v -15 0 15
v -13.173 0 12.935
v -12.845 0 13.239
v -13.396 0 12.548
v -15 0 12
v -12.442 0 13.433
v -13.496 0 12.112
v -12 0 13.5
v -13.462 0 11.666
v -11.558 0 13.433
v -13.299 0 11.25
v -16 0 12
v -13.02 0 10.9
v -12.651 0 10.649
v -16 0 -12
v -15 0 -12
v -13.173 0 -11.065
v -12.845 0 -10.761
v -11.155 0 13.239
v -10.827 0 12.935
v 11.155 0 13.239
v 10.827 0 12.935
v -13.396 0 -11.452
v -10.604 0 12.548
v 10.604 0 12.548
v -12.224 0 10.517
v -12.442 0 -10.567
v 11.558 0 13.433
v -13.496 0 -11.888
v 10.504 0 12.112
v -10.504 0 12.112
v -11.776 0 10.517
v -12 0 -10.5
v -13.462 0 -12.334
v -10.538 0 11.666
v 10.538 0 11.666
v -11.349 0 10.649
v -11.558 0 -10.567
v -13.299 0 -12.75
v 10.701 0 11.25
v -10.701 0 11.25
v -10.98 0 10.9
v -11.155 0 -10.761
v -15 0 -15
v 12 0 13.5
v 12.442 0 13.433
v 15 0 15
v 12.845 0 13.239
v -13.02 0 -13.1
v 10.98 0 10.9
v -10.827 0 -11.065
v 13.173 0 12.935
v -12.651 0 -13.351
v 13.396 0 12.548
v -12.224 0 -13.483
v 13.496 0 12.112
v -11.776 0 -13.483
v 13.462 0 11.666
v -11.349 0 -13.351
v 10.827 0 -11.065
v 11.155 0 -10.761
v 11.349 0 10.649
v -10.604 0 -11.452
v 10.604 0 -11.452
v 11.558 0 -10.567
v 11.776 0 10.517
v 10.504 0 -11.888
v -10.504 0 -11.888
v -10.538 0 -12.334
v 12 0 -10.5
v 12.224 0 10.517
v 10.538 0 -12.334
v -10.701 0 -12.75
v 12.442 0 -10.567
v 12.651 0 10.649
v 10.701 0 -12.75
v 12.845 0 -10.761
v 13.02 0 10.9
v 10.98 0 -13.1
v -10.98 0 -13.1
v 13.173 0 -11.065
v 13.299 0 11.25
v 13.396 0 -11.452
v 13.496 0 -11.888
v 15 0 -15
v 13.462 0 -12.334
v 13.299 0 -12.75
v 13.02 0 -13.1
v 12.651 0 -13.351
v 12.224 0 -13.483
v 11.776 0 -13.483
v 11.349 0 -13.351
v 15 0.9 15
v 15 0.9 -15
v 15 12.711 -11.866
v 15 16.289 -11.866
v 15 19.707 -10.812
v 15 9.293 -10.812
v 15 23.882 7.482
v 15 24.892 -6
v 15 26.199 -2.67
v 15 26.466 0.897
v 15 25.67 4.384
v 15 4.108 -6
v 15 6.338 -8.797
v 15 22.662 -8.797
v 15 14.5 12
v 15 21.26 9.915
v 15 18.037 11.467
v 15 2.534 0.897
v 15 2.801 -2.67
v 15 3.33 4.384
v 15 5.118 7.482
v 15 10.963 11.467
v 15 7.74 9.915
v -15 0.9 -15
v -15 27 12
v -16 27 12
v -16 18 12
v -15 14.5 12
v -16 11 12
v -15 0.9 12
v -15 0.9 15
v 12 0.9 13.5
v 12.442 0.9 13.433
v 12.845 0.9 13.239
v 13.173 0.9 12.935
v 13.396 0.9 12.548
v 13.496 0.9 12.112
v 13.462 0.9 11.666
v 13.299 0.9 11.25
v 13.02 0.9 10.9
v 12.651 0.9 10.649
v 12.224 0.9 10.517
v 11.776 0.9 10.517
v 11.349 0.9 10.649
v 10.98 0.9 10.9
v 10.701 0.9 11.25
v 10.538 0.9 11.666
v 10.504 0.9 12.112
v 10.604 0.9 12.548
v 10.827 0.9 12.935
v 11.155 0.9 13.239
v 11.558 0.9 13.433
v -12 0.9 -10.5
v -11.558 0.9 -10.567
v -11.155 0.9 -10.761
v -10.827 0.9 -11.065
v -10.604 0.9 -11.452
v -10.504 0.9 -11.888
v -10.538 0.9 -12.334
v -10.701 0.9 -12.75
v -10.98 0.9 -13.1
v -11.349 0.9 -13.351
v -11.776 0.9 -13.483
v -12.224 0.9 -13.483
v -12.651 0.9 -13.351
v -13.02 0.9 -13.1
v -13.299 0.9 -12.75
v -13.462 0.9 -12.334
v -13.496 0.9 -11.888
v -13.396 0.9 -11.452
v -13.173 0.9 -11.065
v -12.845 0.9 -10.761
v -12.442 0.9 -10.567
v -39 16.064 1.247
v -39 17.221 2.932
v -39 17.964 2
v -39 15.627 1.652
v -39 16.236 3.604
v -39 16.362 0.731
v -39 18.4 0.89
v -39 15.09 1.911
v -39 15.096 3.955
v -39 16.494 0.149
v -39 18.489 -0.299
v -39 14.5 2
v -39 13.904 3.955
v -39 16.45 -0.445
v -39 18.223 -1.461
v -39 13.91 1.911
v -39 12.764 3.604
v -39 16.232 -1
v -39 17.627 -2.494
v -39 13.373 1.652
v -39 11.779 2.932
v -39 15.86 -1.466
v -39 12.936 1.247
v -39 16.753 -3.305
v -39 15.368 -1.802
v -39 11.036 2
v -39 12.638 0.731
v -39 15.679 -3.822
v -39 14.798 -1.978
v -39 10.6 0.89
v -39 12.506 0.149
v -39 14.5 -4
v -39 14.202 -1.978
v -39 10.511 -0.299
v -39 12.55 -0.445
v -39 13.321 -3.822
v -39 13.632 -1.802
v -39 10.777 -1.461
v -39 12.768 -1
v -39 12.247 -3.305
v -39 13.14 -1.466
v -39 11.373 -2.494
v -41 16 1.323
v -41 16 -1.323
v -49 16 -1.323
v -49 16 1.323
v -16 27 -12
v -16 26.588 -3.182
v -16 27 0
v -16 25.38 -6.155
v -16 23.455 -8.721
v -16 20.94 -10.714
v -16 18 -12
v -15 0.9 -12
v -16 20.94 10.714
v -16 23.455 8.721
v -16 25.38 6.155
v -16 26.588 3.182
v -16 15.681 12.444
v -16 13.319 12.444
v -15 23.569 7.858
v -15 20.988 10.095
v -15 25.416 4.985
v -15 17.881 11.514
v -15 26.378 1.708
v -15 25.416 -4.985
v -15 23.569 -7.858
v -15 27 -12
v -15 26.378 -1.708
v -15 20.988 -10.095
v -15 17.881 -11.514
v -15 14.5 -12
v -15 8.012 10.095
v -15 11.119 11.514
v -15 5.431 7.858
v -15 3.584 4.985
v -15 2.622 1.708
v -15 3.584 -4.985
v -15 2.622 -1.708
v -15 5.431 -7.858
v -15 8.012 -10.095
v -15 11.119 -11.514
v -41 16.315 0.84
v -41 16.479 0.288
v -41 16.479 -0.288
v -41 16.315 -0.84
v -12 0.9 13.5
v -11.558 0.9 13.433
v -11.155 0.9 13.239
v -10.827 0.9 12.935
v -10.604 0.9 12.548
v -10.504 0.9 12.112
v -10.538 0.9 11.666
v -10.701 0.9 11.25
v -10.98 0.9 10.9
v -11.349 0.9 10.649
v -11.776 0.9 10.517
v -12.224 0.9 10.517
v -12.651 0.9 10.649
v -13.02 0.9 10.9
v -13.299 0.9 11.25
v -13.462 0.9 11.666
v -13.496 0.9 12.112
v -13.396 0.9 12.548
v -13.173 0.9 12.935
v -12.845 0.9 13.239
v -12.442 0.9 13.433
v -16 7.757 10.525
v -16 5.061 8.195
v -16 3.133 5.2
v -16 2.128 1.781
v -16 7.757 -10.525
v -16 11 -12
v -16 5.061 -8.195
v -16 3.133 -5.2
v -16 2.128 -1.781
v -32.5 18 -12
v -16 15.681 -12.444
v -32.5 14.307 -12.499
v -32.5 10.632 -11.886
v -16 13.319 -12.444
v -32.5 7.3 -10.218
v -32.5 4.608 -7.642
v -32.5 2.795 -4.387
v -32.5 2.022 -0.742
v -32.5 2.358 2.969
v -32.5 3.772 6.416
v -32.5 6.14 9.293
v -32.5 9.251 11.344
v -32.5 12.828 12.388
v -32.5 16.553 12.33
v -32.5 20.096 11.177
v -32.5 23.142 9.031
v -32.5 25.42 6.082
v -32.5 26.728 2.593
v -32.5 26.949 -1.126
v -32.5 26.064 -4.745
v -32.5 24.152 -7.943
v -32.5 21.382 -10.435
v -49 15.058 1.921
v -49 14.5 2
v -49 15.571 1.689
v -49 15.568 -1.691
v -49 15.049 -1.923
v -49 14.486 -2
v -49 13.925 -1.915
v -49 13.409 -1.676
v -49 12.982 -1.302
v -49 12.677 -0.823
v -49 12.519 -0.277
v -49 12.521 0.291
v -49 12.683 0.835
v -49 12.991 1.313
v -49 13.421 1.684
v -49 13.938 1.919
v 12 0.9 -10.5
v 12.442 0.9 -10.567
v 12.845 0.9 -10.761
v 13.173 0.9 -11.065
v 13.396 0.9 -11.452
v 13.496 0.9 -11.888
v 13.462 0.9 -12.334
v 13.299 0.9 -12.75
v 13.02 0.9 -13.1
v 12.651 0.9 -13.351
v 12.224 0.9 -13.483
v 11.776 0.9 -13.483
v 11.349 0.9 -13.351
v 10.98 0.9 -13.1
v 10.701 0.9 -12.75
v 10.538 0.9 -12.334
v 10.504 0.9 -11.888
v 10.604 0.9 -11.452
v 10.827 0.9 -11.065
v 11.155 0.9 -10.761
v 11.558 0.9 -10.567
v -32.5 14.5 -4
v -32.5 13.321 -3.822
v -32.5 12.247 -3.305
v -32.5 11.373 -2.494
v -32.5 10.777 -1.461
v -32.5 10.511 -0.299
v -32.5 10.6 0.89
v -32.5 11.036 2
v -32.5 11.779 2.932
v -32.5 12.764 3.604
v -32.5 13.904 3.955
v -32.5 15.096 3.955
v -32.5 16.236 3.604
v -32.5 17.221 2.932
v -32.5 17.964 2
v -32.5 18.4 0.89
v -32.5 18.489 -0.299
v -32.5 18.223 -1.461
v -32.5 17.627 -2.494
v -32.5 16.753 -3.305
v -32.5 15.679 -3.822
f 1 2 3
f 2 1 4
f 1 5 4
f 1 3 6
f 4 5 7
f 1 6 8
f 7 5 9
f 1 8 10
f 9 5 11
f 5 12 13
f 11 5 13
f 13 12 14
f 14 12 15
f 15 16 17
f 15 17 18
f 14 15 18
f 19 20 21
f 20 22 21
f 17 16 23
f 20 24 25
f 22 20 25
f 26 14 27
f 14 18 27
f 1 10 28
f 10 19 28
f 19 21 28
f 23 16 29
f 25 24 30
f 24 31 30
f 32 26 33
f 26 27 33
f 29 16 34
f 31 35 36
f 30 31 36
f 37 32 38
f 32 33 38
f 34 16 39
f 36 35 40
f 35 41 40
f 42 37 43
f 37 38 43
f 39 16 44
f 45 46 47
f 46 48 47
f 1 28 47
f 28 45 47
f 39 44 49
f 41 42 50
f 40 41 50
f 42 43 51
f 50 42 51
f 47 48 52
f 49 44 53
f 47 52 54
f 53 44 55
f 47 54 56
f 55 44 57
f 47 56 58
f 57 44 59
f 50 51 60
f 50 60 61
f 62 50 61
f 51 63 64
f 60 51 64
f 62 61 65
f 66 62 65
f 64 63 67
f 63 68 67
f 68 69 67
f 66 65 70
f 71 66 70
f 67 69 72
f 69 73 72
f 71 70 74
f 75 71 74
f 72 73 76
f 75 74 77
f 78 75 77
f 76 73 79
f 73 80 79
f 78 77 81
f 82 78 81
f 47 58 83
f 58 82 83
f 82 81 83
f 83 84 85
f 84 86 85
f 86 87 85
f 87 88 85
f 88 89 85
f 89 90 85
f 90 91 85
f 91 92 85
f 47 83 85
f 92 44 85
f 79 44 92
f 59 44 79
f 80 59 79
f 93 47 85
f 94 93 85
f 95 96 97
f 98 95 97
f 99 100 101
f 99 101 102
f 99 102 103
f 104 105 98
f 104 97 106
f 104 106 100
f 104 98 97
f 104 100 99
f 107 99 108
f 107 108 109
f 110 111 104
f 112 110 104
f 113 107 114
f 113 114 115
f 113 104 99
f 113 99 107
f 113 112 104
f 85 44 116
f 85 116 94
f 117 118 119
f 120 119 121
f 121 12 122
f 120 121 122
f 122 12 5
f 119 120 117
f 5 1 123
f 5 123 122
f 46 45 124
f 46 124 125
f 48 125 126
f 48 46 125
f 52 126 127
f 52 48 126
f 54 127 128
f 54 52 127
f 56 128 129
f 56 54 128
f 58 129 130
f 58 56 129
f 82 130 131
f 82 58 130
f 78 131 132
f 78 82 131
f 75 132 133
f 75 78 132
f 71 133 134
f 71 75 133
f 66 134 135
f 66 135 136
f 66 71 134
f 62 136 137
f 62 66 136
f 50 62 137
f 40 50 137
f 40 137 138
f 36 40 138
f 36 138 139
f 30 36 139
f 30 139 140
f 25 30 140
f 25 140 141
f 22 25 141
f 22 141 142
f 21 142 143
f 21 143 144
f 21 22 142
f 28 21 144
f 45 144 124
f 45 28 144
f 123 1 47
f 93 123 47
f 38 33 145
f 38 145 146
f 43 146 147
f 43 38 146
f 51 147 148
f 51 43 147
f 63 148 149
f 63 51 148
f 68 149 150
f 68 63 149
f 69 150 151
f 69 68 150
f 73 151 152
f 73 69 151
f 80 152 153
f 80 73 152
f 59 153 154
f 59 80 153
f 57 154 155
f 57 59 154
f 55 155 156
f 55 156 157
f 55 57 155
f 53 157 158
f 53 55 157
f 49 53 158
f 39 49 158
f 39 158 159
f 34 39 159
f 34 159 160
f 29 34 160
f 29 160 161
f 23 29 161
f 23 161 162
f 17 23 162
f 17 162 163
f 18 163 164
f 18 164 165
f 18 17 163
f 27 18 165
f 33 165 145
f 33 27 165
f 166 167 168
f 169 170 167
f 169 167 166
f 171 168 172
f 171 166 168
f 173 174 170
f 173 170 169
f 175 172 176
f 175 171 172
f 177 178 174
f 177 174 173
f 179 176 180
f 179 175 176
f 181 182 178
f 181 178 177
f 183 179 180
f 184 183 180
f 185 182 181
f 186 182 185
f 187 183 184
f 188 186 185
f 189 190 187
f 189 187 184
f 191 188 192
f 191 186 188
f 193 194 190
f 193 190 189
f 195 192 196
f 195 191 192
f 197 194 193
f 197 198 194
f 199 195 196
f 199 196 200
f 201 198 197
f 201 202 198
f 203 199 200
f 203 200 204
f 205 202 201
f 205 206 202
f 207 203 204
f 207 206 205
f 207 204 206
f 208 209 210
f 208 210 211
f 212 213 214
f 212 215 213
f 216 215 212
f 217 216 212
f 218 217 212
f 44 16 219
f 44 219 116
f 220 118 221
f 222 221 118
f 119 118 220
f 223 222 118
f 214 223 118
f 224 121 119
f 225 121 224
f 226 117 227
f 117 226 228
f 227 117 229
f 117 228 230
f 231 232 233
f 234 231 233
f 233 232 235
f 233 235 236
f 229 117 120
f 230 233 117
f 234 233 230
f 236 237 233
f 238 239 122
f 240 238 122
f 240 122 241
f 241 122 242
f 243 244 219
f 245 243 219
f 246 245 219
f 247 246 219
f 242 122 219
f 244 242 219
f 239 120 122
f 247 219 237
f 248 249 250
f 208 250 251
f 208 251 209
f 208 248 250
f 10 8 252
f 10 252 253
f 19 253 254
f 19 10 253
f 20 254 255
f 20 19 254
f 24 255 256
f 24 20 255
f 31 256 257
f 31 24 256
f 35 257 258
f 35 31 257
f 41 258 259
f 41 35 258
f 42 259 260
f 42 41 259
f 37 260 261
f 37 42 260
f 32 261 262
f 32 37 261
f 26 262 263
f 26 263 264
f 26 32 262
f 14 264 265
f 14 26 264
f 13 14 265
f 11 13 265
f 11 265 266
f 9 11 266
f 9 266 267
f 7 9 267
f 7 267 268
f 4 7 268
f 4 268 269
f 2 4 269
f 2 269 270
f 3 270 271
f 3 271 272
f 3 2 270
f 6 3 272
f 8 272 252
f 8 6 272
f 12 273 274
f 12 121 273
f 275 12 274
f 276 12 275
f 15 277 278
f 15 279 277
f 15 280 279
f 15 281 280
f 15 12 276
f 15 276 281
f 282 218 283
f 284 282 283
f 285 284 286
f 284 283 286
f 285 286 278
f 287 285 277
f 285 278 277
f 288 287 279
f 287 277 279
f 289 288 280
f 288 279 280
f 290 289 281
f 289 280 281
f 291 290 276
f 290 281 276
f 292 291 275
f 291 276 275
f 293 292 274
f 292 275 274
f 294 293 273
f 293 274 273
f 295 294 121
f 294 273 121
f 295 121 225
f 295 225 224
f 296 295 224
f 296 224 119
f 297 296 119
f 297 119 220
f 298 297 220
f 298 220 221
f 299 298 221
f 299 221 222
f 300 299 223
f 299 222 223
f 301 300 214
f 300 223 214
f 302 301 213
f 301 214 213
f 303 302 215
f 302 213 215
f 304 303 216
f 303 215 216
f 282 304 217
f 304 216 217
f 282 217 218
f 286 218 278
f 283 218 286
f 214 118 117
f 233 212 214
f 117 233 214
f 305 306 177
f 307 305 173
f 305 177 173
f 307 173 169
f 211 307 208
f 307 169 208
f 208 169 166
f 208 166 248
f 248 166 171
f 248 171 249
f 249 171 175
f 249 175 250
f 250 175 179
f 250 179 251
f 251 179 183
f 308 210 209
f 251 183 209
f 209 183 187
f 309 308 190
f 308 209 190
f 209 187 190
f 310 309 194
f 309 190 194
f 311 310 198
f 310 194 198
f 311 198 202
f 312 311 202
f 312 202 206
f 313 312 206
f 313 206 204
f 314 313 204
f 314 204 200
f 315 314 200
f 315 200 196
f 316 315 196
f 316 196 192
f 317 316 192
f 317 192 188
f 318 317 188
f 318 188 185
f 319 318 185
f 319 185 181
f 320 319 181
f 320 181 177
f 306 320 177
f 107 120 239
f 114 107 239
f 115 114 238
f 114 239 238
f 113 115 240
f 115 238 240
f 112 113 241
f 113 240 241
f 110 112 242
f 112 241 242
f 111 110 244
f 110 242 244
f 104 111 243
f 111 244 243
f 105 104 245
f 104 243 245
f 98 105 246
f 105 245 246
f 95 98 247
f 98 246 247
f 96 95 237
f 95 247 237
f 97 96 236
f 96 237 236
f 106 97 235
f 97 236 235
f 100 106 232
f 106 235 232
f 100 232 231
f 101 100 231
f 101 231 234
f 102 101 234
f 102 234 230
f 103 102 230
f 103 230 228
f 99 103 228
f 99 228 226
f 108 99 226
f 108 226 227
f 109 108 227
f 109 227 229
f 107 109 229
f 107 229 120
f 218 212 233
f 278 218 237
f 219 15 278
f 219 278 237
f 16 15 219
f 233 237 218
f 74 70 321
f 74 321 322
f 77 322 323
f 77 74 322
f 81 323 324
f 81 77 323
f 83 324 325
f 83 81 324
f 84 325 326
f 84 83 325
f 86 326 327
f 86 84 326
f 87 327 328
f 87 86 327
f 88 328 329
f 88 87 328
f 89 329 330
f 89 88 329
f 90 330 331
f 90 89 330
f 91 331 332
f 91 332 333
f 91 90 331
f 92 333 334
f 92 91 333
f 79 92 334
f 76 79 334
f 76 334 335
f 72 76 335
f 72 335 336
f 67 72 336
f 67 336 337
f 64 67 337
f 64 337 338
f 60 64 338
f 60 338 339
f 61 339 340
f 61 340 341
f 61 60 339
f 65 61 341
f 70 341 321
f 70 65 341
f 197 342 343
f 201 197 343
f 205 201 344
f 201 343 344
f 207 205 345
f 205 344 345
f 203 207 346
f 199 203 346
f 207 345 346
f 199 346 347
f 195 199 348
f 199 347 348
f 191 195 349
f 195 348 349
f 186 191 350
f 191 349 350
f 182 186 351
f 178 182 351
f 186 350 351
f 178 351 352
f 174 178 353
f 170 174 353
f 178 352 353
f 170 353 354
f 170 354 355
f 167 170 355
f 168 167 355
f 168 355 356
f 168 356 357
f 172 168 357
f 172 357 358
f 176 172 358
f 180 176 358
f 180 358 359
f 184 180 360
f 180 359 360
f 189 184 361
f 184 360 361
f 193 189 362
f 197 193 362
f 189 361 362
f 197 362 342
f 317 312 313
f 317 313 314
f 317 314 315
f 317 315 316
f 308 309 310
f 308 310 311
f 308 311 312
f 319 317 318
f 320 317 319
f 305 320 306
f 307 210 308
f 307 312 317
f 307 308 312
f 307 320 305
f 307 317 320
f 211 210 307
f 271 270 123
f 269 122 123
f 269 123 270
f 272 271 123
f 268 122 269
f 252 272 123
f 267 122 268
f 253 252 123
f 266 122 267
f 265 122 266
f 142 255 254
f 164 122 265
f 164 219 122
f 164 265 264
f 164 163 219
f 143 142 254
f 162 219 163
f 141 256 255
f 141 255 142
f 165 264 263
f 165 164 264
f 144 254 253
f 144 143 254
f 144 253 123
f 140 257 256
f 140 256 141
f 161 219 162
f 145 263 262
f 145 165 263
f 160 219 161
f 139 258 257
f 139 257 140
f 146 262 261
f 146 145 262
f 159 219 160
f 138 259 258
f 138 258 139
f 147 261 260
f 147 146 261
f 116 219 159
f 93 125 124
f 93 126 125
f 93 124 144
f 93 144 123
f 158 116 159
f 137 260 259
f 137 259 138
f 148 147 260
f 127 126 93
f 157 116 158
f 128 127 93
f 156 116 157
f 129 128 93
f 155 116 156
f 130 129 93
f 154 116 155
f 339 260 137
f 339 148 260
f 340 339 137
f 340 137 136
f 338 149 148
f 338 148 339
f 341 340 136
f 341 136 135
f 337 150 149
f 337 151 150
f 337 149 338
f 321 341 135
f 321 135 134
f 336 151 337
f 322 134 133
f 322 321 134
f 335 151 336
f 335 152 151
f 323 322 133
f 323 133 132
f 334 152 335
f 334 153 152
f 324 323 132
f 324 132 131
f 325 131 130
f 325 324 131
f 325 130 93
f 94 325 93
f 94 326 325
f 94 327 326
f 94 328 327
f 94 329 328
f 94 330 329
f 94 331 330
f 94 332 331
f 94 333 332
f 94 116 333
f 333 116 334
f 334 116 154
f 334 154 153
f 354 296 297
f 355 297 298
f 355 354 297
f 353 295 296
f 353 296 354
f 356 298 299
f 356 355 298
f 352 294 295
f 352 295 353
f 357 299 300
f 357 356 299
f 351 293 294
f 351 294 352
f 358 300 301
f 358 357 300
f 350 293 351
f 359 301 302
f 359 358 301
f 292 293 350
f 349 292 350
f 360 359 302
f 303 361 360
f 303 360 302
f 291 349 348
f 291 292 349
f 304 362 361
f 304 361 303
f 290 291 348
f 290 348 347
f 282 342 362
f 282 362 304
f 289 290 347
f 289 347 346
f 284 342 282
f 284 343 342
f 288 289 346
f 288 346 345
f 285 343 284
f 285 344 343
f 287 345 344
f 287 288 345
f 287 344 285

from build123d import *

# Parameters (mm, degrees)
SKETCH1_W           = 30
SKETCH1_H           = 30
SKETCH1_R           = 1.5
BOSS_EXTRUDE2_DEPTH = 0.9
SKETCH9_W           = 1
SKETCH9_H           = 24
BOSS_EXTRUDE3_DEPTH = 27
SKETCH10_R          = 12
BOSS_EXTRUDE4_DEPTH = 30
SKETCH11_R          = 12.5
BOSS_EXTRUDE5_DEPTH = 16.5
SKETCH12_R          = 4
BOSS_EXTRUDE6_DEPTH = 6.5
SKETCH13_R          = 2
BOSS_EXTRUDE7_DEPTH = 10
CUT_EXTRUDE1_START  = -8
CUT_EXTRUDE1_DEPTH  = 8


with BuildPart() as part:
    # Sketch1 → Boss-Extrude2 (new body)
    with BuildSketch(Plane(origin=(0, 0, 0), x_dir=(1, 0, 0), z_dir=(0, 1, 0))):
        Rectangle(SKETCH1_W, SKETCH1_H)
        with Locations(Location((-12, 12, 0), (0, 0, 270))):
            Circle(SKETCH1_R, mode=Mode.SUBTRACT)
        with Locations(Location((12, 12, 0), (0, 0, 270))):
            Circle(SKETCH1_R, mode=Mode.SUBTRACT)
        with Locations(Location((12, -12, 0), (0, 0, 270))):
            Circle(SKETCH1_R, mode=Mode.SUBTRACT)
        with Locations(Location((-12, -12, 0), (0, 0, 270))):
            Circle(SKETCH1_R, mode=Mode.SUBTRACT)
    extrude(amount=BOSS_EXTRUDE2_DEPTH)

    # Sketch9 → Boss-Extrude3 (add)
    with BuildSketch(Plane(origin=(0, 0, 0), x_dir=(1, 0, 0), z_dir=(0, 1, 0))):
        with Locations((-15.5, 0)):
            Rectangle(SKETCH9_W, SKETCH9_H)
    extrude(amount=BOSS_EXTRUDE3_DEPTH)

    # Sketch10 → Boss-Extrude4 (add)
    with BuildSketch(Plane(origin=(-15, 0, 0), x_dir=(0, 0, -1), z_dir=(1, 0, 0))):
        with Locations(Location((0, 14.5, 0), (0, 0, 180))):
            Circle(SKETCH10_R)
    extrude(amount=BOSS_EXTRUDE4_DEPTH)

    # Sketch11 → Boss-Extrude5 (add)
    with BuildSketch(Plane.ZY.offset(16)):
        with Locations(Location((0, 14.5, 0), (0, 0, 163.739795292))):
            Circle(SKETCH11_R)
    extrude(amount=BOSS_EXTRUDE5_DEPTH)

    # Sketch12 → Boss-Extrude6 (add)
    with BuildSketch(Plane.ZY.offset(32.5)):
        with Locations(Location((0, 14.5, 0), (0, 0, 180))):
            Circle(SKETCH12_R)
    extrude(amount=BOSS_EXTRUDE6_DEPTH)

    # Sketch13 → Boss-Extrude7 (add)
    with BuildSketch(Plane.ZY.offset(39)):
        with Locations((0, 14.5)):
            Circle(SKETCH13_R)
    extrude(amount=BOSS_EXTRUDE7_DEPTH)

    # Sketch14 → Cut-Extrude1 (cut)
    with BuildSketch(Plane.ZY.offset(49).offset(CUT_EXTRUDE1_START)):
        with BuildLine():
            Line((-1.322875656, 16), (1.322875656, 16))
            ThreePointArc((1.322875656, 16), (0, 16.5), (-1.322875656, 16))
        make_face()
    extrude(amount=CUT_EXTRUDE1_DEPTH, mode=Mode.SUBTRACT)


solid = part.part
